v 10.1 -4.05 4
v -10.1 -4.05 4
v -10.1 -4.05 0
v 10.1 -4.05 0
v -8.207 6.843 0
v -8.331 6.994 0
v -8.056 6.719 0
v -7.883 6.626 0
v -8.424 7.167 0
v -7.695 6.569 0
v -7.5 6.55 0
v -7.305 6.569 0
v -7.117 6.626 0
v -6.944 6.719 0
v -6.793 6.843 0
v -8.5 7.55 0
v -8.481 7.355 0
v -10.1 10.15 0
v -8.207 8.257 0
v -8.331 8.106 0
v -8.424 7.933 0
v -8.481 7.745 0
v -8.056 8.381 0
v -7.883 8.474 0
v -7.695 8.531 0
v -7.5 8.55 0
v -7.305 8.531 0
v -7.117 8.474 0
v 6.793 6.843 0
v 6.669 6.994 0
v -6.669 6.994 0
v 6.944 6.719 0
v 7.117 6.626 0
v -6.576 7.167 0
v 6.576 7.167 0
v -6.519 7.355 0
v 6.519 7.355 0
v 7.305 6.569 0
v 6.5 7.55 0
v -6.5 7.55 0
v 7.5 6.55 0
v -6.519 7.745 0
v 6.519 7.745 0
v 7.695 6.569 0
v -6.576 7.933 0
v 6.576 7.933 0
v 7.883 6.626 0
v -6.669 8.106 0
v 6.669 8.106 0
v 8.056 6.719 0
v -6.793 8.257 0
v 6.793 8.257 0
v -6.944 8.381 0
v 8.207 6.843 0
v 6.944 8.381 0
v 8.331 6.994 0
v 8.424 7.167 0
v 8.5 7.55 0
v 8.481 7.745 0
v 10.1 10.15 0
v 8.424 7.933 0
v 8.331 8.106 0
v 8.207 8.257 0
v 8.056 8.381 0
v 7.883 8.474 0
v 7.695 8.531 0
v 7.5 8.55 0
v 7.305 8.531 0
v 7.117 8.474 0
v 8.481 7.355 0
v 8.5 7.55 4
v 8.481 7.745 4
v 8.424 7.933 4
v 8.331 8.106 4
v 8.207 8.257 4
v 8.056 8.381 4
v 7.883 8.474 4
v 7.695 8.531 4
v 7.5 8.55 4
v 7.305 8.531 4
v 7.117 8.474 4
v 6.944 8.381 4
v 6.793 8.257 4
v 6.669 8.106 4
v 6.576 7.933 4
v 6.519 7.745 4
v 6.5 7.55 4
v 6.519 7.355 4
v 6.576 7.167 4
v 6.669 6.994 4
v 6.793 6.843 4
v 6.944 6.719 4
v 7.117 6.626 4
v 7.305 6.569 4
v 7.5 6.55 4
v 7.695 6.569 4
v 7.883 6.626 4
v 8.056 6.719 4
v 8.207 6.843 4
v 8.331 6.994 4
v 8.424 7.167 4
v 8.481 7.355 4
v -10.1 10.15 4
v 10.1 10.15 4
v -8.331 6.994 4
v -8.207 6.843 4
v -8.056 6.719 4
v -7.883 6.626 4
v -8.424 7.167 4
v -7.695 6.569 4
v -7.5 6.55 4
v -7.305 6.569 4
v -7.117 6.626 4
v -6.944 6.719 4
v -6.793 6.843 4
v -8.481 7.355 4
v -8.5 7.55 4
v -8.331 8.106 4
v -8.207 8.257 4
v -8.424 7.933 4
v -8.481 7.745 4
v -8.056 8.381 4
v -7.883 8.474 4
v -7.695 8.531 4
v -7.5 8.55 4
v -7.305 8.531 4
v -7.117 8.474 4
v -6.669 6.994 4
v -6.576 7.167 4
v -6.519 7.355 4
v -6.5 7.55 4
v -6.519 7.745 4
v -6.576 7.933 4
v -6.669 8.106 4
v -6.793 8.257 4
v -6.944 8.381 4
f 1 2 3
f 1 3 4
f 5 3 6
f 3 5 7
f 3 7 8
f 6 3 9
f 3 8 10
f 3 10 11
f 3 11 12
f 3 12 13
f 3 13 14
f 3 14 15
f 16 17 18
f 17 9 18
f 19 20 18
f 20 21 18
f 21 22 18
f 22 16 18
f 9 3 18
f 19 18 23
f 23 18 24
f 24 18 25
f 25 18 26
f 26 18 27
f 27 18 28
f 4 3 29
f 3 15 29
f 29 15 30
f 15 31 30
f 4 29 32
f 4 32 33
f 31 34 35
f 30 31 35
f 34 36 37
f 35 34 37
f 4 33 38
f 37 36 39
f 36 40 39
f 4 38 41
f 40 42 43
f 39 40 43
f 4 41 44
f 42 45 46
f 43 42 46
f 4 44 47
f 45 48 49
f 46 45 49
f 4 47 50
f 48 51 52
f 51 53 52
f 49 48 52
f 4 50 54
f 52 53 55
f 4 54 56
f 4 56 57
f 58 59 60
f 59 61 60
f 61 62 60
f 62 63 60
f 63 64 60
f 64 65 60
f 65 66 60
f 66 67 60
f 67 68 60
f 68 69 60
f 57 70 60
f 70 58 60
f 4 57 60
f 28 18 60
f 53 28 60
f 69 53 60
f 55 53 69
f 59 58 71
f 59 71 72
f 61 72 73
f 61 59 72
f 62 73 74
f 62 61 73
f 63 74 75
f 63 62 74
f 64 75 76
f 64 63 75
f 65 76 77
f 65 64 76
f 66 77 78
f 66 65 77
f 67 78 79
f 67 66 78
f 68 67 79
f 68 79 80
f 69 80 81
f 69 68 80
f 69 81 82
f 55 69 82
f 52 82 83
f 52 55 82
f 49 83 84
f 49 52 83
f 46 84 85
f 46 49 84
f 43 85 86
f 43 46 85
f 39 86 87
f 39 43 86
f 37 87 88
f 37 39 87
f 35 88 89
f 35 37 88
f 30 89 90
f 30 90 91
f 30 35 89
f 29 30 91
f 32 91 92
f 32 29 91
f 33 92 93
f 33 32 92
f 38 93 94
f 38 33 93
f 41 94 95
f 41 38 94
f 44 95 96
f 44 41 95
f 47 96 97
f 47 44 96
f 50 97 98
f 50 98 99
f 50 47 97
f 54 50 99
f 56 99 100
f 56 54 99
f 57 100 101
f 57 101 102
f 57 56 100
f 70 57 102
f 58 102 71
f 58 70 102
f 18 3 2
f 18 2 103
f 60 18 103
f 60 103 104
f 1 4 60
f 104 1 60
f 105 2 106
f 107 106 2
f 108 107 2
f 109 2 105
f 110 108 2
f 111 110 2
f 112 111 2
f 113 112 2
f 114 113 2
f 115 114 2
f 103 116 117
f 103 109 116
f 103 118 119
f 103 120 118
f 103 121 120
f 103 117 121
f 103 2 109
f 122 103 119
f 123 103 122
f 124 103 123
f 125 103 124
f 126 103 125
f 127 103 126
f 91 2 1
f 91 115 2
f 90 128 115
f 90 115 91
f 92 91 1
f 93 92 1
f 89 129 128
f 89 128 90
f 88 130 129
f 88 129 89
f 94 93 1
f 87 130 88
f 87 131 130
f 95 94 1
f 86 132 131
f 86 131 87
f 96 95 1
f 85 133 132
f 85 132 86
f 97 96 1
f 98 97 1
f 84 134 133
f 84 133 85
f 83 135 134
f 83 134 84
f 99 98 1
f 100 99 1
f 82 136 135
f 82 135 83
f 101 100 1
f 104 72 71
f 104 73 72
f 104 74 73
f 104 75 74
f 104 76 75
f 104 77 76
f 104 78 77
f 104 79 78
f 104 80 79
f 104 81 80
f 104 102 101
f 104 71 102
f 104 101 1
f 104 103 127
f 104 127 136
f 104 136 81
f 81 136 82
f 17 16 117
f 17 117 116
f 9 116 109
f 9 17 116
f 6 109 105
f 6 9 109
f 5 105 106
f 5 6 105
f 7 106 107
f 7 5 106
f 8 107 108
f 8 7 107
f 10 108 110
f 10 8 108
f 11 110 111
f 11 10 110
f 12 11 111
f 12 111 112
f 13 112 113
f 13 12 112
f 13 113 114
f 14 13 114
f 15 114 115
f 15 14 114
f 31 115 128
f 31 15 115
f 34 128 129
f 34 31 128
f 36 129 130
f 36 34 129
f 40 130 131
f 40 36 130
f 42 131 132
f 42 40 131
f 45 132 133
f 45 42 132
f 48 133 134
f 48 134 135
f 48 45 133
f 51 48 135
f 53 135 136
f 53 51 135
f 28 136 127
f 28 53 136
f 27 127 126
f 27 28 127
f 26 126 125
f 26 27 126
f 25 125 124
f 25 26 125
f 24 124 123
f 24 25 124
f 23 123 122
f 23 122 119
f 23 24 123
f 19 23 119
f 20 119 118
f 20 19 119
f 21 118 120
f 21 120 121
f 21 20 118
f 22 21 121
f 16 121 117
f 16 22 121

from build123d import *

# Parameters (mm, degrees)
SKETCH1_W           = 20.2
SKETCH1_H           = 20.2
SKETCH1_R           = 1
BOSS_EXTRUDE1_DEPTH = 4
SKETCH2_R           = 7
SKETCH2_R_2         = 4
CUT_EXTRUDE1_DEPTH  = 4
SKETCH3_R           = 4
BOSS_EXTRUDE2_DEPTH = 4
SKETCH4_W           = 20.2
SKETCH4_H           = 6
CUT_EXTRUDE2_DEPTH  = 10


with BuildPart() as part:
    # Sketch1 → Boss-Extrude1 (new body)
    with BuildSketch(Plane.XY):
        with Locations((0, 0.05)):
            Rectangle(SKETCH1_W, SKETCH1_H)
        with Locations((7.5, 7.55)):
            Circle(SKETCH1_R, mode=Mode.SUBTRACT)
        with Locations(Location((-7.5, 7.55, 0), (0, 0, 180))):
            Circle(SKETCH1_R, mode=Mode.SUBTRACT)
        with Locations((7.5, -8.7)):
            Circle(SKETCH1_R, mode=Mode.SUBTRACT)
        with Locations(Location((-7.5, -8.7, 0), (0, 0, 180))):
            Circle(SKETCH1_R, mode=Mode.SUBTRACT)
    extrude(amount=BOSS_EXTRUDE1_DEPTH)

    # Sketch2 → Cut-Extrude1 (cut)
    with BuildSketch(Plane.XY.offset(4)):
        with Locations((0, -13.32)):
            Circle(SKETCH2_R)
        Circle(SKETCH2_R_2)
    extrude(amount=-CUT_EXTRUDE1_DEPTH, mode=Mode.SUBTRACT)

    # Sketch3 → Boss-Extrude2 (add)
    with BuildSketch(Plane.XY.offset(4)):
        Circle(SKETCH3_R)
    extrude(amount=-BOSS_EXTRUDE2_DEPTH)

    # Sketch4 → Cut-Extrude2 (cut)
    with BuildSketch(Plane.XY.offset(4)):
        with Locations((0, -7.05)):
            Rectangle(SKETCH4_W, SKETCH4_H)
    extrude(amount=-CUT_EXTRUDE2_DEPTH, mode=Mode.SUBTRACT)


solid = part.part
